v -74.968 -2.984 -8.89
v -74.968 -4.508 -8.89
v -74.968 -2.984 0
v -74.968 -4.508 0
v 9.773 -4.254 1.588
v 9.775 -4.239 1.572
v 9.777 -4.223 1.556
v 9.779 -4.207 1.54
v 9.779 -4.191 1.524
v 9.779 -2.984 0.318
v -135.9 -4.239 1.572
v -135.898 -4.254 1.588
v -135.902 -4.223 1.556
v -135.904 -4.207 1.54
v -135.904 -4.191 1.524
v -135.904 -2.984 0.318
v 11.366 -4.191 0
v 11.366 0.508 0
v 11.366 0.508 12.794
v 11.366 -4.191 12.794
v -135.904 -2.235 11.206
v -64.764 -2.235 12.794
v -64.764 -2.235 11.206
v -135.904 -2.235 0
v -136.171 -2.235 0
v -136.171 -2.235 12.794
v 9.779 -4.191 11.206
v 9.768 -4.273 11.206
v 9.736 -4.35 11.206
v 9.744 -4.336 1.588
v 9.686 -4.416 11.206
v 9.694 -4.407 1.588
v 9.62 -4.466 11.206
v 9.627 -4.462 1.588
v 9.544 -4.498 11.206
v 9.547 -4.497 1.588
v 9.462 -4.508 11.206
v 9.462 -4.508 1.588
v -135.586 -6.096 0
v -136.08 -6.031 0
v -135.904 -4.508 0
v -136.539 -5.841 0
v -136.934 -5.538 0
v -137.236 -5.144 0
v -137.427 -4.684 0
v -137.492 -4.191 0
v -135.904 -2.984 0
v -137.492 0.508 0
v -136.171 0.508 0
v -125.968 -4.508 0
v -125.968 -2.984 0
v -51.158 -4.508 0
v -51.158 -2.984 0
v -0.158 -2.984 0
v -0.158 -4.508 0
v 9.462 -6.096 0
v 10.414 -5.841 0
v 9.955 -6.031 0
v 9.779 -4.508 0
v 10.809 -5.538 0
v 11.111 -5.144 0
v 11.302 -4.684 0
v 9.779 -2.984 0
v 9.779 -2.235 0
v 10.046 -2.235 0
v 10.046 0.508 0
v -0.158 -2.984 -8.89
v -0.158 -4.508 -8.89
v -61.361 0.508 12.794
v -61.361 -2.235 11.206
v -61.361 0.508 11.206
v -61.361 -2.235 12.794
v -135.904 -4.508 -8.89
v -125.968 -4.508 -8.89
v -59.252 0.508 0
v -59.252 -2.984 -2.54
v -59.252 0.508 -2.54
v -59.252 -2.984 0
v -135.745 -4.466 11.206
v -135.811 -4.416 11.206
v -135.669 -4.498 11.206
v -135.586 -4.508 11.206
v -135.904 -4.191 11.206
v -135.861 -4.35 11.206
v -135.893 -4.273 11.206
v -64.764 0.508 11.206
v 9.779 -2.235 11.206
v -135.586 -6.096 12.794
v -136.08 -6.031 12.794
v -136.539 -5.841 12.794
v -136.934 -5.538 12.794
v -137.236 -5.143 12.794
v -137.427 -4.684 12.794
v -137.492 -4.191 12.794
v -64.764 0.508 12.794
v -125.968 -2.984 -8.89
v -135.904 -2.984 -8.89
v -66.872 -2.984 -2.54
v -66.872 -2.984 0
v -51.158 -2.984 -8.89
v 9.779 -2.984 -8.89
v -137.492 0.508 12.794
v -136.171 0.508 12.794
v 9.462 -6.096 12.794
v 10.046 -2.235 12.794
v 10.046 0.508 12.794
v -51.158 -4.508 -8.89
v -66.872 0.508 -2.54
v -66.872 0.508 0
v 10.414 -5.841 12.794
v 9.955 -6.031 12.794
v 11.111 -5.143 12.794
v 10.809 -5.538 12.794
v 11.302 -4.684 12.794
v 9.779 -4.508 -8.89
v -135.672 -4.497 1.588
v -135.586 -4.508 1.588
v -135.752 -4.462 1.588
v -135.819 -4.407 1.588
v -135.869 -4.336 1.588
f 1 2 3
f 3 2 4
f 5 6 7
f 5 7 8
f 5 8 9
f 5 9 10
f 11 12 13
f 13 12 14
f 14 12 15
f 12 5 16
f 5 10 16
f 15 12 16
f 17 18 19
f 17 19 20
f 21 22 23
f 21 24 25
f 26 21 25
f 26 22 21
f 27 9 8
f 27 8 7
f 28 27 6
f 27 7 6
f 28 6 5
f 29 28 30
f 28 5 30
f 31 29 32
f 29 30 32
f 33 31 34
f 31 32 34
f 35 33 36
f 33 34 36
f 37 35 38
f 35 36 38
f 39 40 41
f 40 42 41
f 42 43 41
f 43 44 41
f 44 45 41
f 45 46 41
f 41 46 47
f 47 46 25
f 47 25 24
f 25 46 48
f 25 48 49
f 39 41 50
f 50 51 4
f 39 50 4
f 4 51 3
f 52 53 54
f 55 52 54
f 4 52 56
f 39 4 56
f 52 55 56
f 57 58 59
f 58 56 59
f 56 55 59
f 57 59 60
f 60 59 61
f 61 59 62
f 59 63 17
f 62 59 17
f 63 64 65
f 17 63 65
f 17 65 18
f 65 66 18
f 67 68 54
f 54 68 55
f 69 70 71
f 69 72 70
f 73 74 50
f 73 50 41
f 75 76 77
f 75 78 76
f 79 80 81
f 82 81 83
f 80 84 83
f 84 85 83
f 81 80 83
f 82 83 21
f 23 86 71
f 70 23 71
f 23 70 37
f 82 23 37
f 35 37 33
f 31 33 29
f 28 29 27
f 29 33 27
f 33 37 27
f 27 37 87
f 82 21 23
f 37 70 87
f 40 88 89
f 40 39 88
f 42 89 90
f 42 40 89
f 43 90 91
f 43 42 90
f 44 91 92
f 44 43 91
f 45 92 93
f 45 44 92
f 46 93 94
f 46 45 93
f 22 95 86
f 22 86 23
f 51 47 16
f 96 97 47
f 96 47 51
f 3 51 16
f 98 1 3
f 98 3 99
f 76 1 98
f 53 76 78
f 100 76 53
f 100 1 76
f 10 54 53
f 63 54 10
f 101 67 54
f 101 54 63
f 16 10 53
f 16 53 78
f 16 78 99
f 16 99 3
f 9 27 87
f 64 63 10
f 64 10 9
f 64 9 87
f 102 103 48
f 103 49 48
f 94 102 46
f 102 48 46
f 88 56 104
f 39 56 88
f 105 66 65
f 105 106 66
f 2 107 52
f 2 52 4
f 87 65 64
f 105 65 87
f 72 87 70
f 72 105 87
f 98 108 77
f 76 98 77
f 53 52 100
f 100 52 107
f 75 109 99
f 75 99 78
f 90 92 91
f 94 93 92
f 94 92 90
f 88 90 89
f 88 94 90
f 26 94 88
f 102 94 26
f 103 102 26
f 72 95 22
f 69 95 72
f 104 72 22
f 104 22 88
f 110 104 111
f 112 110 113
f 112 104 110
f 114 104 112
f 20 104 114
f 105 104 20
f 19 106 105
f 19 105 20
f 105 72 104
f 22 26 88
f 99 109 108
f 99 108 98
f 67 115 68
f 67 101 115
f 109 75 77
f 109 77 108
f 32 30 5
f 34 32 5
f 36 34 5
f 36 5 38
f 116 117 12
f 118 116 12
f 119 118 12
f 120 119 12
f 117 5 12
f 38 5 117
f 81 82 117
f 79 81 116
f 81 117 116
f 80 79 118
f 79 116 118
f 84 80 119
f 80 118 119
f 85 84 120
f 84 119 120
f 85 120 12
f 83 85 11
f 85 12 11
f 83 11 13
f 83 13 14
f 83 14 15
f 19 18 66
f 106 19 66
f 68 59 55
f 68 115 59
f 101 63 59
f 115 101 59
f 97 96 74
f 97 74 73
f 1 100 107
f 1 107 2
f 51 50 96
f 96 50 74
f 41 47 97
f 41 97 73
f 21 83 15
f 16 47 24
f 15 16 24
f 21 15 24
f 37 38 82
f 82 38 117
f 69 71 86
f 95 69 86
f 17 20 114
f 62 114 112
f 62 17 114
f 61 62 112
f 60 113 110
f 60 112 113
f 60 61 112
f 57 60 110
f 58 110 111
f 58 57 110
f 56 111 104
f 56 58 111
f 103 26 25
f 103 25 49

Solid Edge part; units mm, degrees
sketch "Sketch1" plane through (-62.4275, 25.9494, 0) normal (0, 0, 1) x (-1, 0, 0)
  line L0 (75.064, 25.4416) -> (75.064, 28.4894)
  line L1 (75.064, 30.1404) -> (75.064, 28.4894)
  arc A0 (73.159, 32.0454) -> (75.064, 30.1404) centre (73.159, 30.1404) cw
  line L2 (-71.889, 32.0454) -> (73.159, 32.0454)
  arc A1 (-73.794, 30.1404) -> (-71.889, 32.0454) centre (-71.889, 30.1404) cw
  line L3 (-73.794, 28.4894) -> (-73.794, 30.1404)
  line L4 (-73.794, 28.4894) -> (-73.794, 25.4416)
  line L5 (-73.794, 25.4416) -> (-72.2065, 25.4416)
  line L6 (-72.2065, 26.9019) -> (-72.2065, 25.4416)
  line L7 (-72.2065, 26.9019) -> (-72.2065, 30.1404)
  arc A2 (-72.2065, 30.1404) -> (-71.889, 30.4579) centre (-71.889, 30.1404) cw
  line L8 (-71.889, 30.4579) -> (73.159, 30.4579)
  arc A3 (73.159, 30.4579) -> (73.4765, 30.1404) centre (73.159, 30.1404) cw
  line L9 (73.4765, 30.1404) -> (73.4765, 26.9019)
  line L10 (73.4765, 25.4416) -> (73.4765, 26.9019)
  line L11 (73.4765, 25.4416) -> (75.064, 25.4416)
extrude "Protrusion1" add sketch "Sketch1" along normal up to vertex (12 mm away)
sketch "Sketch2" plane through (-62.4275, -3.81, 12) normal (0, 0, 1) x (-1, 0, 0)
  line L0 (75.064, -4.3178) -> (75.064, 0.381)
  arc A0 (75.064, 0.381) -> (73.159, 2.286) centre (73.159, 0.381) ccw
  line L1 (73.159, 2.286) -> (-71.889, 2.286)
  arc A1 (-71.889, 2.286) -> (-73.794, 0.381) centre (-71.889, 0.381) ccw
  line L2 (-73.794, -1.27) -> (-73.794, 0.381)
  line L3 (-73.794, -1.27) -> (-73.794, -4.3178)
  line L4 (75.064, -4.3178) -> (-73.794, -4.3178)
extrude "Protrusion2" add sketch "Sketch2" along normal mid plane 1.5875
sketch "Sketch3" plane through (-62.4275, -3.81, 12.7938) normal (0, 0, 1) x (-1, 0, 0)
  line L0 (73.7432, -1.5748) -> (73.7432, -63.278)
  line L1 (73.7432, -63.278) -> (2.3368, -63.278)
  line L2 (2.3368, -63.278) -> (2.3368, -1.5748)
  line L3 (2.3368, -1.5748) -> (73.7432, -1.5748)
  line L4 (-72.4732, -63.278) -> (-72.4732, -1.5748)
  line L5 (-72.4732, -1.5748) -> (-1.0668, -1.5748)
  line L6 (-1.0668, -1.5748) -> (-1.0668, -63.278)
  line L7 (-1.0668, -63.278) -> (-72.4732, -63.278)
  dimension "D1" = 0.2032
  dimension "D2" = 0.2032
extrude "Cutout1" cut sketch "Sketch3" against normal up to vertex (12.7938 mm away)
sketch "Sketch4" plane through (-62.4275, -2.7941, 0) normal (0, 0, -1) x (-1, 0, 0)
  line L0 (73.4765, -0.1904) -> (-72.2065, -0.1904)
  line L1 (-72.2065, -0.1904) -> (-72.2065, -1.7144)
  line L2 (-72.2065, -1.7144) -> (73.4765, -1.7144)
  line L3 (73.4765, -0.1904) -> (73.4765, -1.7144)
extrude "ExtrudedProtrusion_3" add sketch "Sketch4" against normal blind 1.5875 and the other way blind 8.89
chamfer "Chamfer_1" distance 1.27 angle 45 1 edges at (-63.0625, -2.9845, 1.5875)
sketch "Sketch5" plane through (-62.4275, -2.7941, 0) normal (0, 0, -1) x (-1, 0, 0)
  line L0 (-3.175, -1.7144) -> (-3.175, 3.3019)
  line L1 (-3.175, 3.3019) -> (4.445, 3.3019)
  line L2 (4.445, 3.3019) -> (4.445, -1.7144)
  line L3 (4.445, -1.7144) -> (-3.175, -1.7144)
extrude "ExtrudedProtrusion_4" add sketch "Sketch5" along normal blind 2.54
sketch "Sketch6" plane through (-62.4275, -4.5085, -4.445) normal (0, -1, 0) x (1, 0, 0)
  line L0 (11.27, -20.066) -> (62.27, -20.066)
  line L1 (62.27, -20.066) -> (62.27, 4.445)
  line L2 (62.27, 4.445) -> (11.27, 4.445)
  line L3 (11.27, 4.445) -> (11.27, -20.066)
  line L4 (-63.54, -20.066) -> (-12.54, -20.066)
  line L5 (-12.54, -20.066) -> (-12.54, 4.445)
  line L6 (-12.54, 4.445) -> (-63.54, 4.445)
  line L7 (-63.54, 4.445) -> (-63.54, -20.066)
extrude "Cutout2" cut sketch "Sketch6" against normal through all
